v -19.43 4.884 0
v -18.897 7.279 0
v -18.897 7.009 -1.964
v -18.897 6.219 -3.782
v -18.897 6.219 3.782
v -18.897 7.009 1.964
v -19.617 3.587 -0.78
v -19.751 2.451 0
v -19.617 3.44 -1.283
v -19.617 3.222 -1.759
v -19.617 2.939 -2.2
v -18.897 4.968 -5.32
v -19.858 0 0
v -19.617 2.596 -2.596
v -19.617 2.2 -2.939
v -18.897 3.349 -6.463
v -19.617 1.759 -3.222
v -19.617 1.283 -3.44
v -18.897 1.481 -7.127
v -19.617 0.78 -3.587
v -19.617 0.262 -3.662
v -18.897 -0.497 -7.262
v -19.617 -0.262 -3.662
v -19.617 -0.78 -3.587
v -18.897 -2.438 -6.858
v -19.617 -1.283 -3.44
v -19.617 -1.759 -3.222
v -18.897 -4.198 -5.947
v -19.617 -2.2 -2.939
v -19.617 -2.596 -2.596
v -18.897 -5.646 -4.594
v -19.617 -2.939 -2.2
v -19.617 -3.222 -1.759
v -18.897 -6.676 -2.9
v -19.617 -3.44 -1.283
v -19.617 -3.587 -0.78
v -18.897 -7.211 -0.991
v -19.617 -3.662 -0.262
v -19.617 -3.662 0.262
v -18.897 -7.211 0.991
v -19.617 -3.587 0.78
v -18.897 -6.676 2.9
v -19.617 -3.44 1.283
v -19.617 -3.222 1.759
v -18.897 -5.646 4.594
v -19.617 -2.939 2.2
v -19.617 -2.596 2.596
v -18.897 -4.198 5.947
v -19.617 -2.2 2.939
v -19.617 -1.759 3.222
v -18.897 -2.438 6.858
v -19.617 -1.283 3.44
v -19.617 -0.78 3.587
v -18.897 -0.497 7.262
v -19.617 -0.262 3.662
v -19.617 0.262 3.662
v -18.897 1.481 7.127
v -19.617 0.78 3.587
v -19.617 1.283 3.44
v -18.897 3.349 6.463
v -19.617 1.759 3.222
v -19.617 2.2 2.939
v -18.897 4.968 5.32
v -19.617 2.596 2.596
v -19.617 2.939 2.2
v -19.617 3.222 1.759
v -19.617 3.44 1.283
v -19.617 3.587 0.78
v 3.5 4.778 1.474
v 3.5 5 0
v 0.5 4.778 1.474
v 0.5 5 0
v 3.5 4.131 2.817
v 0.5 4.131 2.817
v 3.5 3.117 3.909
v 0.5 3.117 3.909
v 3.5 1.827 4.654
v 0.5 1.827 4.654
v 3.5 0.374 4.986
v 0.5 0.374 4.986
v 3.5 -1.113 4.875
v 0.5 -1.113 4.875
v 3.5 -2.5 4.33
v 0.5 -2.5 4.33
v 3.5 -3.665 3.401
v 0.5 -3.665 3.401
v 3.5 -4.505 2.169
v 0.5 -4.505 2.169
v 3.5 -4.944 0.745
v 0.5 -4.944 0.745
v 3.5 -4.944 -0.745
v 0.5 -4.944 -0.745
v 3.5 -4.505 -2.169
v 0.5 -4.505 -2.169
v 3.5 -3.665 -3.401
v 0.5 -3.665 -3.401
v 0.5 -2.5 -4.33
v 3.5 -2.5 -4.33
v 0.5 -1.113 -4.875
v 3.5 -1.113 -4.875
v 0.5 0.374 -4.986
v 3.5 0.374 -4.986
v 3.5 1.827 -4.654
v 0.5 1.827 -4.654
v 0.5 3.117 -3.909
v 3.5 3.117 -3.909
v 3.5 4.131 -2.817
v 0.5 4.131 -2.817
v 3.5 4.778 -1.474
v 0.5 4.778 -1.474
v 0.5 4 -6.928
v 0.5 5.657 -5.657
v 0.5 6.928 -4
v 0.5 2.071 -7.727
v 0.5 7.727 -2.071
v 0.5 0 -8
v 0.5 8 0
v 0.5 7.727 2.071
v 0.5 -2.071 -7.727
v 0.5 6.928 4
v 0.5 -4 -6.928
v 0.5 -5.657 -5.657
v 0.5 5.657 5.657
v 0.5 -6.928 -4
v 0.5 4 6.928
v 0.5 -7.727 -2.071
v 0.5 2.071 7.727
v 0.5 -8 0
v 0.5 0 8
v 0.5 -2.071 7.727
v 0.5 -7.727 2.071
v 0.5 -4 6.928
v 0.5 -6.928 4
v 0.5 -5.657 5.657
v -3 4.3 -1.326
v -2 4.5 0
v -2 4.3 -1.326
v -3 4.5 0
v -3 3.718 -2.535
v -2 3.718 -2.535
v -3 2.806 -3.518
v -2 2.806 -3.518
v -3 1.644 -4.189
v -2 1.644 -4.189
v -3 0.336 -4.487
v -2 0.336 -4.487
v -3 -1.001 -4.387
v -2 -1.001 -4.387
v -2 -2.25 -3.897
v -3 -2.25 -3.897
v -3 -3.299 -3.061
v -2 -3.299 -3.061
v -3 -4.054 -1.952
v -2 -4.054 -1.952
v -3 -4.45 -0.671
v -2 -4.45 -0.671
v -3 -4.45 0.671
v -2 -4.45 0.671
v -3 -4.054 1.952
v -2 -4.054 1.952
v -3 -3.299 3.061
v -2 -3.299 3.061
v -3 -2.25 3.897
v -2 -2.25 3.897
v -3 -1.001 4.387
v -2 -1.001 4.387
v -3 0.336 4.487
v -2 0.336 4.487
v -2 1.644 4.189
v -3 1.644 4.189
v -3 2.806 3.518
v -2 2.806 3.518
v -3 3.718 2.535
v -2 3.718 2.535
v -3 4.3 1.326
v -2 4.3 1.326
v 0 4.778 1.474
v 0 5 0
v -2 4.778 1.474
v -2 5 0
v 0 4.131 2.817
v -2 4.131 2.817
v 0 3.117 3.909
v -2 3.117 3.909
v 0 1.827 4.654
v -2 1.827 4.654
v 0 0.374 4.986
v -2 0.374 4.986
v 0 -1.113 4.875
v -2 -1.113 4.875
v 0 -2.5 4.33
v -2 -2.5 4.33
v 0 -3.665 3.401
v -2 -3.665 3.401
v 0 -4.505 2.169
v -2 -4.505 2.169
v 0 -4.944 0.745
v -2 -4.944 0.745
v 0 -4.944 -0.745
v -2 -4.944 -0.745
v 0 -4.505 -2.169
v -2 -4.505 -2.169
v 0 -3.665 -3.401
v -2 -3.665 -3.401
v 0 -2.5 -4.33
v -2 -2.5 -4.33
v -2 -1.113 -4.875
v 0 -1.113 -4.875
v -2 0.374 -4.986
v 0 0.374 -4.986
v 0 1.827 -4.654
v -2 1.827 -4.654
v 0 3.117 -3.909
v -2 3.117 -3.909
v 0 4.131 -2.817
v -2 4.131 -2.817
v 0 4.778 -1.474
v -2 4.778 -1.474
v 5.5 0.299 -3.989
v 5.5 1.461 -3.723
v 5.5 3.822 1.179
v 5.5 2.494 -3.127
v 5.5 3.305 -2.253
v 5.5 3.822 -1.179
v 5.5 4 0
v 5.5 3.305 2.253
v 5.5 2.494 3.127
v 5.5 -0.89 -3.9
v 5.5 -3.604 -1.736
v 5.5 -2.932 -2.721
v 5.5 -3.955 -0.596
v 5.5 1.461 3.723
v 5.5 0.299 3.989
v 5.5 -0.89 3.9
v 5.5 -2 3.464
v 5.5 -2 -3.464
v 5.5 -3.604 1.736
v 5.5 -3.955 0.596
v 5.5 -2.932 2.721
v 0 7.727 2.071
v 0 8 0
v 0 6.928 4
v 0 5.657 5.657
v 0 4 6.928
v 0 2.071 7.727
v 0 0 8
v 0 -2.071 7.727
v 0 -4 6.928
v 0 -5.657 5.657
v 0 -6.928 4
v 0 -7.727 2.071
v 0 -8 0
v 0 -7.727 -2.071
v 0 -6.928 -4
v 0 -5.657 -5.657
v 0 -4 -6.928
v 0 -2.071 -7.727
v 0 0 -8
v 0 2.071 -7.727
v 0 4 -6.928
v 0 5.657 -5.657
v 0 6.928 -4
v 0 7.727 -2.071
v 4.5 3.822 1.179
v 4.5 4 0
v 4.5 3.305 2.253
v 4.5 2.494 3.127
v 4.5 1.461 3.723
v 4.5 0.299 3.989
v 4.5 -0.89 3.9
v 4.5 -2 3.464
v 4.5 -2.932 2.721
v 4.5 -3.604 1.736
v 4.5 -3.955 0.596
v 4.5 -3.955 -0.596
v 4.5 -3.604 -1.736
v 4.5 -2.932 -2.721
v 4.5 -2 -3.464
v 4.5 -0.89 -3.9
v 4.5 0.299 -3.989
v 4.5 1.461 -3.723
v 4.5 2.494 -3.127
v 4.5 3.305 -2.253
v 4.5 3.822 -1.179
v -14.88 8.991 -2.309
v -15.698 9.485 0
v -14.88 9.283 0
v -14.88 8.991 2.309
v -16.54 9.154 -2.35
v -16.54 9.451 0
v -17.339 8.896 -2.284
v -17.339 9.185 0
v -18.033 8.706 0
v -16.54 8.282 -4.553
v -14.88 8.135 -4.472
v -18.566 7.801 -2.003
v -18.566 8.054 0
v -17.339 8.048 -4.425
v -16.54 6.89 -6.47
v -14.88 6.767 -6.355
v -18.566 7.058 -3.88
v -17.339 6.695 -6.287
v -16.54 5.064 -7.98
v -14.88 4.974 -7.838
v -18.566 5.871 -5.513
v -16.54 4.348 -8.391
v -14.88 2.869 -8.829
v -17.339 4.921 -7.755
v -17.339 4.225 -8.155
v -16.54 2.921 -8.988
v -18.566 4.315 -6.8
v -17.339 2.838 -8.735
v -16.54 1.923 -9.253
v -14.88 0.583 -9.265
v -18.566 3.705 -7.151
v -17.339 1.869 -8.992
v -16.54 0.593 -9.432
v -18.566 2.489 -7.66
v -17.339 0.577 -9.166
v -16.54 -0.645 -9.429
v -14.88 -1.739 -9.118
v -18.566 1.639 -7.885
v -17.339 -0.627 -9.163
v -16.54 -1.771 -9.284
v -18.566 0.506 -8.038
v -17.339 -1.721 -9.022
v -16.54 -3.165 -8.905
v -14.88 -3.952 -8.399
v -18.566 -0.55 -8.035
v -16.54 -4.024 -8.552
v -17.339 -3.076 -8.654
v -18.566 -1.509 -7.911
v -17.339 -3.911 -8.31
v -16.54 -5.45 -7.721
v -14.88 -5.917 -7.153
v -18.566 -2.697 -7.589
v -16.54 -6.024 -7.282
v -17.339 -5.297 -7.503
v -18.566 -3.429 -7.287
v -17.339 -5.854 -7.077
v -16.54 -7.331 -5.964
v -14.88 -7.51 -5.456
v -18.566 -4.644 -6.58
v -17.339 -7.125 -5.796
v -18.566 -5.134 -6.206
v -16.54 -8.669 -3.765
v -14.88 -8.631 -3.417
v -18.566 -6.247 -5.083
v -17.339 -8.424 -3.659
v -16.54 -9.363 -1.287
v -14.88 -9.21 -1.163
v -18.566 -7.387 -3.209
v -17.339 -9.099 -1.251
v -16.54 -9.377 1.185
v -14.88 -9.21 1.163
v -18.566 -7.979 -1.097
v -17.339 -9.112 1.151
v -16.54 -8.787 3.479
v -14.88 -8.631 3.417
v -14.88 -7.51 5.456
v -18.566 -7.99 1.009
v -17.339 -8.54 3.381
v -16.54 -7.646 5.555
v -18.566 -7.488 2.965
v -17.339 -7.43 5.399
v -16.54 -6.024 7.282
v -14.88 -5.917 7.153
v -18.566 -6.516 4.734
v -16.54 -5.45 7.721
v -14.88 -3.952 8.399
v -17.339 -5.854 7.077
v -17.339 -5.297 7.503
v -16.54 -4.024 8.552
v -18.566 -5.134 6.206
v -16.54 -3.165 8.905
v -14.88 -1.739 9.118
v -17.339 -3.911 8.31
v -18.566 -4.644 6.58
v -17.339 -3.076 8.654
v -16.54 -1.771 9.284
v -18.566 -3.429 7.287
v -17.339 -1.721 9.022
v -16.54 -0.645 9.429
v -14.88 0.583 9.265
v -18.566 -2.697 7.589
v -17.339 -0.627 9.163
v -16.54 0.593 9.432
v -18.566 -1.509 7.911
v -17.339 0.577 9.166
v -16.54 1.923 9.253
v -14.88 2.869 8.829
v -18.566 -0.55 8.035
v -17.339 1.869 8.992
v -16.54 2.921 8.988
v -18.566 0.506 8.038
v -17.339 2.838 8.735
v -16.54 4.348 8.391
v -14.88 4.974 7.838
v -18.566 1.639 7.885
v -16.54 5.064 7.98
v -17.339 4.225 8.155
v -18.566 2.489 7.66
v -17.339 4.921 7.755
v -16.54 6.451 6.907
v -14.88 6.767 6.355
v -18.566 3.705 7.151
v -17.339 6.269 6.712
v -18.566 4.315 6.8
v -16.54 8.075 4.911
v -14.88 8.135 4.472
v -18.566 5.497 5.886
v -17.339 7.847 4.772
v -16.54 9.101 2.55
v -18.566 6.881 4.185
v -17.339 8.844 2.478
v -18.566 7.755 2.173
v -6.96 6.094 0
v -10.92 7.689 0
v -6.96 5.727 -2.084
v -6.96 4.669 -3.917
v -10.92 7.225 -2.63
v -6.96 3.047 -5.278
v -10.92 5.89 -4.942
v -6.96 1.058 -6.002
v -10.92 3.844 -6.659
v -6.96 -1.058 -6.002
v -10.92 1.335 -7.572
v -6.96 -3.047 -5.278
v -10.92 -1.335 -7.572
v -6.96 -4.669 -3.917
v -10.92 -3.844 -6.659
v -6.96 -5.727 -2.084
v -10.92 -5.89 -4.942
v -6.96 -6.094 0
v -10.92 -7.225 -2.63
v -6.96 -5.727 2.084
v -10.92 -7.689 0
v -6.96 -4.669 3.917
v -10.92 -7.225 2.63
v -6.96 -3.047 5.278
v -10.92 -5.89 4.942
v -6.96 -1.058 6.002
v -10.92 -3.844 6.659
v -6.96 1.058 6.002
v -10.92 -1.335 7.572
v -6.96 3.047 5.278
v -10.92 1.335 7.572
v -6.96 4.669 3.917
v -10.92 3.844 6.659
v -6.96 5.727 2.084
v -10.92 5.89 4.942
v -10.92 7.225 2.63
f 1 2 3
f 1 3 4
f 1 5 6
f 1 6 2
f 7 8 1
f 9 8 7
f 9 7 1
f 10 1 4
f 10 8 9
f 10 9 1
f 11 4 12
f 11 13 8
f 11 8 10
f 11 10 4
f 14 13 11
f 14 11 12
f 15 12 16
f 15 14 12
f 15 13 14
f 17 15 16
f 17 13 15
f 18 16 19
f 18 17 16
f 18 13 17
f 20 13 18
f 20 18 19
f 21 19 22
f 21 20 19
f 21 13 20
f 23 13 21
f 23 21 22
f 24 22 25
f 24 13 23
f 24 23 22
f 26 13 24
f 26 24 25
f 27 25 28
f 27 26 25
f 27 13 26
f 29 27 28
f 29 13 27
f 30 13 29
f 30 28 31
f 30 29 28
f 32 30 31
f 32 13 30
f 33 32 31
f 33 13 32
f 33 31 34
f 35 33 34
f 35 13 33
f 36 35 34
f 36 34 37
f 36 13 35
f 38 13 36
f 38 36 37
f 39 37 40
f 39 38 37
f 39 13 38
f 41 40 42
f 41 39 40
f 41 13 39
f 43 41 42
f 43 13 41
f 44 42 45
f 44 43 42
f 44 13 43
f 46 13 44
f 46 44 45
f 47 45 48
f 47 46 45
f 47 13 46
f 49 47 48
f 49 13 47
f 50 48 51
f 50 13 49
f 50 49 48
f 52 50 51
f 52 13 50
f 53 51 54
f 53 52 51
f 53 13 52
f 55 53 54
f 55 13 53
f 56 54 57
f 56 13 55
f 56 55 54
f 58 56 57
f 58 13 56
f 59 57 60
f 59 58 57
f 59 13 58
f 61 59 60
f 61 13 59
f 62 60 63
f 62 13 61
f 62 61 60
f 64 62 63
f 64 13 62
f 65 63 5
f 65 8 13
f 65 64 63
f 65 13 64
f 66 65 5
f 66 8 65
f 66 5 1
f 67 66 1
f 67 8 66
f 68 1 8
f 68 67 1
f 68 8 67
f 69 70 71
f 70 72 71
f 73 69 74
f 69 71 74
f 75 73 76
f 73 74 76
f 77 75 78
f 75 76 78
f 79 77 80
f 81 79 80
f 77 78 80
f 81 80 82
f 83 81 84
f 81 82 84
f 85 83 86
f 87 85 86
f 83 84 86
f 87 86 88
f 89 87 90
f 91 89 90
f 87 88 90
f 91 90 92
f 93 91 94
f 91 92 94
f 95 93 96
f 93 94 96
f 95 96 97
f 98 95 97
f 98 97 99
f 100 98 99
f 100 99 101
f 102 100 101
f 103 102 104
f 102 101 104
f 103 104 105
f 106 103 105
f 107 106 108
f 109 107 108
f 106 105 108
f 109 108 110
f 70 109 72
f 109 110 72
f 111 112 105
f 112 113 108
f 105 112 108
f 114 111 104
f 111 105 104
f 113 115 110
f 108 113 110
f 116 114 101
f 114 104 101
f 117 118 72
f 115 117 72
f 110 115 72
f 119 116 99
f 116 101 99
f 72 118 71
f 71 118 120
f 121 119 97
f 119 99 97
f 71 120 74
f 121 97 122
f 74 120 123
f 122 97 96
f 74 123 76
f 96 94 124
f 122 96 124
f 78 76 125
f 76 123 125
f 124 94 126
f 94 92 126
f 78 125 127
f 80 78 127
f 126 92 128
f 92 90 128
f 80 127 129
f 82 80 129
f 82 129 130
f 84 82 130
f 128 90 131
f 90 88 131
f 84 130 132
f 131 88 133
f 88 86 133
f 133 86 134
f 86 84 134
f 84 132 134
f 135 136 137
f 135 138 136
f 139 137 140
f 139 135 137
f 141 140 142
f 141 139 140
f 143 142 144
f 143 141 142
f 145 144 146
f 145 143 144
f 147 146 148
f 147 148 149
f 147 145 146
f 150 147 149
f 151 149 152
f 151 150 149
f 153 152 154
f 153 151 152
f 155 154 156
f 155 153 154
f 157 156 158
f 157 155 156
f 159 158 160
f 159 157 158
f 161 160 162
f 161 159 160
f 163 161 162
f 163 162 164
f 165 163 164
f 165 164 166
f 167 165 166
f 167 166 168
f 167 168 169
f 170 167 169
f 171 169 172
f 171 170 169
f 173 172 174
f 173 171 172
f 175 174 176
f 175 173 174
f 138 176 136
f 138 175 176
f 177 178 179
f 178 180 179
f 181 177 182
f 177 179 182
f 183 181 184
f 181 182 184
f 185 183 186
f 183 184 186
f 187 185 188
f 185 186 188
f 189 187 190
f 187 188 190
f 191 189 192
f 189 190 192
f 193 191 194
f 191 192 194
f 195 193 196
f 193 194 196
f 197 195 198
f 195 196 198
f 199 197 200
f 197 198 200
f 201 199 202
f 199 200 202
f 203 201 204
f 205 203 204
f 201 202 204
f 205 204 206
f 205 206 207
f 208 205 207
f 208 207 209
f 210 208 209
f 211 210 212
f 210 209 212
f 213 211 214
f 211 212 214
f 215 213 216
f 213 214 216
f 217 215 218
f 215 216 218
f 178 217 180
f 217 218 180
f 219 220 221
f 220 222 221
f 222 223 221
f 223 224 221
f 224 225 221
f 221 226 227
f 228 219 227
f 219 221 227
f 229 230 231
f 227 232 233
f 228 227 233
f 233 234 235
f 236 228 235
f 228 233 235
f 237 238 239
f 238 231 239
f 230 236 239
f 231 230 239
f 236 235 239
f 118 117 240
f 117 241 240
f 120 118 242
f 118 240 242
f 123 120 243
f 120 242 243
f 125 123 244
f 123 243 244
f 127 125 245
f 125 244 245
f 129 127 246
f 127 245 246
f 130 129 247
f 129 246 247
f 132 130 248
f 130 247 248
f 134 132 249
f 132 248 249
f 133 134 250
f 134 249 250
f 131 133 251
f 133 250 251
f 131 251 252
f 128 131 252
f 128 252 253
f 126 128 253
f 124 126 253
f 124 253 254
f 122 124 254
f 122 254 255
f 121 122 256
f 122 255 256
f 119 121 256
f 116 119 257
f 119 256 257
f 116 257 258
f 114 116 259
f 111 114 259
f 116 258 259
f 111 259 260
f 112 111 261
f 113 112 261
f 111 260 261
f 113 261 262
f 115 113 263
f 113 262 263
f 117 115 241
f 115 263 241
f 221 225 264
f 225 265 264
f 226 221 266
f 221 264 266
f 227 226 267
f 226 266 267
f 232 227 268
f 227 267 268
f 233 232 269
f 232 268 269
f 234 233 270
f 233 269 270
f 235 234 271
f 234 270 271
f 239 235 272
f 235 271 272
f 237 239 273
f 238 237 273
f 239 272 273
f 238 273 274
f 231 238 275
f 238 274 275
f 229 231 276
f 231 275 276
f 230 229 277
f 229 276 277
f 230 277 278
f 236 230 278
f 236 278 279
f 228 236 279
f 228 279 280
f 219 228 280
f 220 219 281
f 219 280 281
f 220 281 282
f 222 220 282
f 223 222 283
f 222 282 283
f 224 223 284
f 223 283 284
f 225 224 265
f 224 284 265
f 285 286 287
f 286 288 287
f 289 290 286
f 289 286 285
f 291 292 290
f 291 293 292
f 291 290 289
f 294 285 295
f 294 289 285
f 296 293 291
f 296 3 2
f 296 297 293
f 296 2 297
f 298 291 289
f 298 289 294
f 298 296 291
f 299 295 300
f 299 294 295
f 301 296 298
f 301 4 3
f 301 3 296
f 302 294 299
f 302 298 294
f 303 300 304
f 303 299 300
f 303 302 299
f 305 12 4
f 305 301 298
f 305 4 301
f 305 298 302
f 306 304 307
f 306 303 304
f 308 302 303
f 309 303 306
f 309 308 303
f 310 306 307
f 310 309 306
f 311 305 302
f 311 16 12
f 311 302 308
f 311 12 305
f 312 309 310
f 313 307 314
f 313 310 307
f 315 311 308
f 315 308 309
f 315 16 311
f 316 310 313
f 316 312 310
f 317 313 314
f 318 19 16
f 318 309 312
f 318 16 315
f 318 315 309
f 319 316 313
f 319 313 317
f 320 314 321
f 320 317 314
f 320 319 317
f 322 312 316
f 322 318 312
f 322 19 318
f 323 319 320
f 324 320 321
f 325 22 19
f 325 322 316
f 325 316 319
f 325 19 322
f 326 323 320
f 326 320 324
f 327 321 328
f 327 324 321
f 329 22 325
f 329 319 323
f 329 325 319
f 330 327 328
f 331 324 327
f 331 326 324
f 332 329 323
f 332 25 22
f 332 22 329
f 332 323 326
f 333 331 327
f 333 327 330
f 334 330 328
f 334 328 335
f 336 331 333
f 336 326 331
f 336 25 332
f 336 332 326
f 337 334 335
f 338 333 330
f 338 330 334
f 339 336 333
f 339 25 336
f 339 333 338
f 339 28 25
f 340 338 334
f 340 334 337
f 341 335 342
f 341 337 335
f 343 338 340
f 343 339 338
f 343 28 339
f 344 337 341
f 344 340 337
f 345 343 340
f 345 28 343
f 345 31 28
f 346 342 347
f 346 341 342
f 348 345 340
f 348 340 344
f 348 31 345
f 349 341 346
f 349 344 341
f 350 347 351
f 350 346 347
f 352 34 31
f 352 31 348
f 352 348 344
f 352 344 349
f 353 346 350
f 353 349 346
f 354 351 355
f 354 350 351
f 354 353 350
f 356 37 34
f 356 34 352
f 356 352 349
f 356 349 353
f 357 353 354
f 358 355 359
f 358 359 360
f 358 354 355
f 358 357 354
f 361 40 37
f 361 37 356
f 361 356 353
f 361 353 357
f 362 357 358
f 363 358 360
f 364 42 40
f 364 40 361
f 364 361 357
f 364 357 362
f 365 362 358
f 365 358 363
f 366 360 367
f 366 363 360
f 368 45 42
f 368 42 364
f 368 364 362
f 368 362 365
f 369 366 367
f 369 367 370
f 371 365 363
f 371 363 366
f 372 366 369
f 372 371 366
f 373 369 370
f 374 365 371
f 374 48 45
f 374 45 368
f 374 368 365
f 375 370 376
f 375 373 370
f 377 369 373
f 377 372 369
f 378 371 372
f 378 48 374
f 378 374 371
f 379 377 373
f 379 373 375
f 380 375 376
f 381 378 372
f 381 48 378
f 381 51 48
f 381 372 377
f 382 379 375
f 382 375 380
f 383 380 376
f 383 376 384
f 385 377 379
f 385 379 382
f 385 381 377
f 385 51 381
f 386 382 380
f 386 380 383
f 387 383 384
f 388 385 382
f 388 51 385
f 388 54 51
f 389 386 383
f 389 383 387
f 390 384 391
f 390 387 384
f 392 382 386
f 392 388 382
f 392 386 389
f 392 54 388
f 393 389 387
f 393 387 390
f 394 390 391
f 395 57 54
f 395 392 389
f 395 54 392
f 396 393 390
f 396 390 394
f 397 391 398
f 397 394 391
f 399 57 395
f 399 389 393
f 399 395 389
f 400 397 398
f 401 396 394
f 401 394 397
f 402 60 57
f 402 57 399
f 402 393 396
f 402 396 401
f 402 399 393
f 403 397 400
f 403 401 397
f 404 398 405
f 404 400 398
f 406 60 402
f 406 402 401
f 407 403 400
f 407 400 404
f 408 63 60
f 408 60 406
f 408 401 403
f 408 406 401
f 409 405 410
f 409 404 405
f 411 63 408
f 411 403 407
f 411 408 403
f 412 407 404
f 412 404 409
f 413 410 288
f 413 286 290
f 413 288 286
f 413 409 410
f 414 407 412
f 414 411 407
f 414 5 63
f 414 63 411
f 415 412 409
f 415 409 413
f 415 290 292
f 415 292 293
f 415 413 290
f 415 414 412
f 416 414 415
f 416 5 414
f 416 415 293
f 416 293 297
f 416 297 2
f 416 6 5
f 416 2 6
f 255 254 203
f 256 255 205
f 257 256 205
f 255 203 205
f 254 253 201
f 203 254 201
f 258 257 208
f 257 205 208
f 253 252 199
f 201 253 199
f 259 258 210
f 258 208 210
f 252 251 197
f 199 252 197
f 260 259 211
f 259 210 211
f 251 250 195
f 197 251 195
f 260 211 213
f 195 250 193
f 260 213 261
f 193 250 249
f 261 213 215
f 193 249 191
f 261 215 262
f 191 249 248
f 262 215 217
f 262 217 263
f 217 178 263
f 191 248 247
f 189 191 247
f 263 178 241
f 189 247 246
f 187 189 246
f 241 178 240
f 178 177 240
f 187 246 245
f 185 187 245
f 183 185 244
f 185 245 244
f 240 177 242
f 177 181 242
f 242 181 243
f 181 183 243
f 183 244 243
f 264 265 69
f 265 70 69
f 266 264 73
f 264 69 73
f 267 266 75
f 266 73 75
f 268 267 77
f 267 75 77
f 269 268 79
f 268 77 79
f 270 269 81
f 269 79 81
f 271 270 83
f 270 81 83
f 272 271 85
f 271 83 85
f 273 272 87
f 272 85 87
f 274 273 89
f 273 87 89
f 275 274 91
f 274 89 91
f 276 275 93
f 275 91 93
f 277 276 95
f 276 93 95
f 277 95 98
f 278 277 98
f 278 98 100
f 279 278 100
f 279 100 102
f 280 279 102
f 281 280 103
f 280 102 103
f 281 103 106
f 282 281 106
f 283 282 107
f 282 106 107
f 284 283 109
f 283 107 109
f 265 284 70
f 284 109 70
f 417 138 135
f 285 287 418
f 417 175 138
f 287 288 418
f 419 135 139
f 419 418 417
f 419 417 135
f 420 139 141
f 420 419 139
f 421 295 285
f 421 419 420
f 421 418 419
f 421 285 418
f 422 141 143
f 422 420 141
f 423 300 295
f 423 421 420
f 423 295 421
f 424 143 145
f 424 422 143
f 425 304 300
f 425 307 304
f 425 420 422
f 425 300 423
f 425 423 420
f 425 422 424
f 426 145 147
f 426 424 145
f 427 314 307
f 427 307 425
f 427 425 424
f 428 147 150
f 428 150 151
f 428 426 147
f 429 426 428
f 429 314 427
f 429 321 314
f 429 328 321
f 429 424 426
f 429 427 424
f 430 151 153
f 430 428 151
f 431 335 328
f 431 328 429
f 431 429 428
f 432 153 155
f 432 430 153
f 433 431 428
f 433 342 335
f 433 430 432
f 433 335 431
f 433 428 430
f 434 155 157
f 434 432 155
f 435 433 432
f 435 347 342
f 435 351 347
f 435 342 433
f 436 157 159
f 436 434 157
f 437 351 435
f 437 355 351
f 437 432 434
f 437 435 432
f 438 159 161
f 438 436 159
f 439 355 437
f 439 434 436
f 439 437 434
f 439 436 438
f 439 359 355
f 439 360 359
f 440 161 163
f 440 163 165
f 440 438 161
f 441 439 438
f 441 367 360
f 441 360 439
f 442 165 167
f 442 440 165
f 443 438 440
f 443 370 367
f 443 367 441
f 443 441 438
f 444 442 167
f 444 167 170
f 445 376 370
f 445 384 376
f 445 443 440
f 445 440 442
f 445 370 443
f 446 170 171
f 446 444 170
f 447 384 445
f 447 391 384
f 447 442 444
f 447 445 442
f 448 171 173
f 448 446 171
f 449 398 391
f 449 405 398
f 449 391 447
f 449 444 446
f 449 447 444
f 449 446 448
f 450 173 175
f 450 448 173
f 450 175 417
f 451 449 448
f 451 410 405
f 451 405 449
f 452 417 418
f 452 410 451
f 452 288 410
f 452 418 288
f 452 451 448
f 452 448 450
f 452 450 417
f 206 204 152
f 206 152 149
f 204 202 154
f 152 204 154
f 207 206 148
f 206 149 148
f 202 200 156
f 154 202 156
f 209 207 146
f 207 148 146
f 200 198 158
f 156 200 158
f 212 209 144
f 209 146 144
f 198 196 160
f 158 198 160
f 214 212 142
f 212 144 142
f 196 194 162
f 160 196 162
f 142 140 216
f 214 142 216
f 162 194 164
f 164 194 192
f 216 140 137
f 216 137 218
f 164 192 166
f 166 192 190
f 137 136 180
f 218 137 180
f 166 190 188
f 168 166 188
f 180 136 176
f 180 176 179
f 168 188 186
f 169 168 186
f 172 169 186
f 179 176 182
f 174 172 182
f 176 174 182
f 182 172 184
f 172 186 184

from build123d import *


with BuildPart() as part:
    # Sketch2 → Revolve1 (revolve)
    with BuildSketch(Plane.XY):
        Polygon((5.5, 0), (5.5, 4), (4.5, 4), (3.5, 5), (0.5, 5), (0.5, 8), (0, 8), (0, 5), (-2, 5), (-2, 0), align=None)
    revolve(axis=Axis((-2, 0, 0), (1, 0, 0)))

    # Sketch4 → Revolve2 (revolve)
    with BuildSketch(Plane.XY):
        with BuildLine():
            Line((0, 4.5), (-3, 4.5))
            Line((-3, 4.5), (-14.879552076, 9.282911506))
            ThreePointArc((-14.879552076, 9.282911506), (-17.339156162, 9.184522448), (-18.897161062, 7.278753994))
            ThreePointArc((-18.897161062, 7.278753994), (-19.617023423, 3.670972882), (-19.858362338, 0))
            Line((-19.858362338, 0), (0, 0))
            Line((0, 0), (0, 4.5))
        make_face()
    revolve(axis=Axis((0, 0, 0), (-1, 0, 0)))


solid = part.part
